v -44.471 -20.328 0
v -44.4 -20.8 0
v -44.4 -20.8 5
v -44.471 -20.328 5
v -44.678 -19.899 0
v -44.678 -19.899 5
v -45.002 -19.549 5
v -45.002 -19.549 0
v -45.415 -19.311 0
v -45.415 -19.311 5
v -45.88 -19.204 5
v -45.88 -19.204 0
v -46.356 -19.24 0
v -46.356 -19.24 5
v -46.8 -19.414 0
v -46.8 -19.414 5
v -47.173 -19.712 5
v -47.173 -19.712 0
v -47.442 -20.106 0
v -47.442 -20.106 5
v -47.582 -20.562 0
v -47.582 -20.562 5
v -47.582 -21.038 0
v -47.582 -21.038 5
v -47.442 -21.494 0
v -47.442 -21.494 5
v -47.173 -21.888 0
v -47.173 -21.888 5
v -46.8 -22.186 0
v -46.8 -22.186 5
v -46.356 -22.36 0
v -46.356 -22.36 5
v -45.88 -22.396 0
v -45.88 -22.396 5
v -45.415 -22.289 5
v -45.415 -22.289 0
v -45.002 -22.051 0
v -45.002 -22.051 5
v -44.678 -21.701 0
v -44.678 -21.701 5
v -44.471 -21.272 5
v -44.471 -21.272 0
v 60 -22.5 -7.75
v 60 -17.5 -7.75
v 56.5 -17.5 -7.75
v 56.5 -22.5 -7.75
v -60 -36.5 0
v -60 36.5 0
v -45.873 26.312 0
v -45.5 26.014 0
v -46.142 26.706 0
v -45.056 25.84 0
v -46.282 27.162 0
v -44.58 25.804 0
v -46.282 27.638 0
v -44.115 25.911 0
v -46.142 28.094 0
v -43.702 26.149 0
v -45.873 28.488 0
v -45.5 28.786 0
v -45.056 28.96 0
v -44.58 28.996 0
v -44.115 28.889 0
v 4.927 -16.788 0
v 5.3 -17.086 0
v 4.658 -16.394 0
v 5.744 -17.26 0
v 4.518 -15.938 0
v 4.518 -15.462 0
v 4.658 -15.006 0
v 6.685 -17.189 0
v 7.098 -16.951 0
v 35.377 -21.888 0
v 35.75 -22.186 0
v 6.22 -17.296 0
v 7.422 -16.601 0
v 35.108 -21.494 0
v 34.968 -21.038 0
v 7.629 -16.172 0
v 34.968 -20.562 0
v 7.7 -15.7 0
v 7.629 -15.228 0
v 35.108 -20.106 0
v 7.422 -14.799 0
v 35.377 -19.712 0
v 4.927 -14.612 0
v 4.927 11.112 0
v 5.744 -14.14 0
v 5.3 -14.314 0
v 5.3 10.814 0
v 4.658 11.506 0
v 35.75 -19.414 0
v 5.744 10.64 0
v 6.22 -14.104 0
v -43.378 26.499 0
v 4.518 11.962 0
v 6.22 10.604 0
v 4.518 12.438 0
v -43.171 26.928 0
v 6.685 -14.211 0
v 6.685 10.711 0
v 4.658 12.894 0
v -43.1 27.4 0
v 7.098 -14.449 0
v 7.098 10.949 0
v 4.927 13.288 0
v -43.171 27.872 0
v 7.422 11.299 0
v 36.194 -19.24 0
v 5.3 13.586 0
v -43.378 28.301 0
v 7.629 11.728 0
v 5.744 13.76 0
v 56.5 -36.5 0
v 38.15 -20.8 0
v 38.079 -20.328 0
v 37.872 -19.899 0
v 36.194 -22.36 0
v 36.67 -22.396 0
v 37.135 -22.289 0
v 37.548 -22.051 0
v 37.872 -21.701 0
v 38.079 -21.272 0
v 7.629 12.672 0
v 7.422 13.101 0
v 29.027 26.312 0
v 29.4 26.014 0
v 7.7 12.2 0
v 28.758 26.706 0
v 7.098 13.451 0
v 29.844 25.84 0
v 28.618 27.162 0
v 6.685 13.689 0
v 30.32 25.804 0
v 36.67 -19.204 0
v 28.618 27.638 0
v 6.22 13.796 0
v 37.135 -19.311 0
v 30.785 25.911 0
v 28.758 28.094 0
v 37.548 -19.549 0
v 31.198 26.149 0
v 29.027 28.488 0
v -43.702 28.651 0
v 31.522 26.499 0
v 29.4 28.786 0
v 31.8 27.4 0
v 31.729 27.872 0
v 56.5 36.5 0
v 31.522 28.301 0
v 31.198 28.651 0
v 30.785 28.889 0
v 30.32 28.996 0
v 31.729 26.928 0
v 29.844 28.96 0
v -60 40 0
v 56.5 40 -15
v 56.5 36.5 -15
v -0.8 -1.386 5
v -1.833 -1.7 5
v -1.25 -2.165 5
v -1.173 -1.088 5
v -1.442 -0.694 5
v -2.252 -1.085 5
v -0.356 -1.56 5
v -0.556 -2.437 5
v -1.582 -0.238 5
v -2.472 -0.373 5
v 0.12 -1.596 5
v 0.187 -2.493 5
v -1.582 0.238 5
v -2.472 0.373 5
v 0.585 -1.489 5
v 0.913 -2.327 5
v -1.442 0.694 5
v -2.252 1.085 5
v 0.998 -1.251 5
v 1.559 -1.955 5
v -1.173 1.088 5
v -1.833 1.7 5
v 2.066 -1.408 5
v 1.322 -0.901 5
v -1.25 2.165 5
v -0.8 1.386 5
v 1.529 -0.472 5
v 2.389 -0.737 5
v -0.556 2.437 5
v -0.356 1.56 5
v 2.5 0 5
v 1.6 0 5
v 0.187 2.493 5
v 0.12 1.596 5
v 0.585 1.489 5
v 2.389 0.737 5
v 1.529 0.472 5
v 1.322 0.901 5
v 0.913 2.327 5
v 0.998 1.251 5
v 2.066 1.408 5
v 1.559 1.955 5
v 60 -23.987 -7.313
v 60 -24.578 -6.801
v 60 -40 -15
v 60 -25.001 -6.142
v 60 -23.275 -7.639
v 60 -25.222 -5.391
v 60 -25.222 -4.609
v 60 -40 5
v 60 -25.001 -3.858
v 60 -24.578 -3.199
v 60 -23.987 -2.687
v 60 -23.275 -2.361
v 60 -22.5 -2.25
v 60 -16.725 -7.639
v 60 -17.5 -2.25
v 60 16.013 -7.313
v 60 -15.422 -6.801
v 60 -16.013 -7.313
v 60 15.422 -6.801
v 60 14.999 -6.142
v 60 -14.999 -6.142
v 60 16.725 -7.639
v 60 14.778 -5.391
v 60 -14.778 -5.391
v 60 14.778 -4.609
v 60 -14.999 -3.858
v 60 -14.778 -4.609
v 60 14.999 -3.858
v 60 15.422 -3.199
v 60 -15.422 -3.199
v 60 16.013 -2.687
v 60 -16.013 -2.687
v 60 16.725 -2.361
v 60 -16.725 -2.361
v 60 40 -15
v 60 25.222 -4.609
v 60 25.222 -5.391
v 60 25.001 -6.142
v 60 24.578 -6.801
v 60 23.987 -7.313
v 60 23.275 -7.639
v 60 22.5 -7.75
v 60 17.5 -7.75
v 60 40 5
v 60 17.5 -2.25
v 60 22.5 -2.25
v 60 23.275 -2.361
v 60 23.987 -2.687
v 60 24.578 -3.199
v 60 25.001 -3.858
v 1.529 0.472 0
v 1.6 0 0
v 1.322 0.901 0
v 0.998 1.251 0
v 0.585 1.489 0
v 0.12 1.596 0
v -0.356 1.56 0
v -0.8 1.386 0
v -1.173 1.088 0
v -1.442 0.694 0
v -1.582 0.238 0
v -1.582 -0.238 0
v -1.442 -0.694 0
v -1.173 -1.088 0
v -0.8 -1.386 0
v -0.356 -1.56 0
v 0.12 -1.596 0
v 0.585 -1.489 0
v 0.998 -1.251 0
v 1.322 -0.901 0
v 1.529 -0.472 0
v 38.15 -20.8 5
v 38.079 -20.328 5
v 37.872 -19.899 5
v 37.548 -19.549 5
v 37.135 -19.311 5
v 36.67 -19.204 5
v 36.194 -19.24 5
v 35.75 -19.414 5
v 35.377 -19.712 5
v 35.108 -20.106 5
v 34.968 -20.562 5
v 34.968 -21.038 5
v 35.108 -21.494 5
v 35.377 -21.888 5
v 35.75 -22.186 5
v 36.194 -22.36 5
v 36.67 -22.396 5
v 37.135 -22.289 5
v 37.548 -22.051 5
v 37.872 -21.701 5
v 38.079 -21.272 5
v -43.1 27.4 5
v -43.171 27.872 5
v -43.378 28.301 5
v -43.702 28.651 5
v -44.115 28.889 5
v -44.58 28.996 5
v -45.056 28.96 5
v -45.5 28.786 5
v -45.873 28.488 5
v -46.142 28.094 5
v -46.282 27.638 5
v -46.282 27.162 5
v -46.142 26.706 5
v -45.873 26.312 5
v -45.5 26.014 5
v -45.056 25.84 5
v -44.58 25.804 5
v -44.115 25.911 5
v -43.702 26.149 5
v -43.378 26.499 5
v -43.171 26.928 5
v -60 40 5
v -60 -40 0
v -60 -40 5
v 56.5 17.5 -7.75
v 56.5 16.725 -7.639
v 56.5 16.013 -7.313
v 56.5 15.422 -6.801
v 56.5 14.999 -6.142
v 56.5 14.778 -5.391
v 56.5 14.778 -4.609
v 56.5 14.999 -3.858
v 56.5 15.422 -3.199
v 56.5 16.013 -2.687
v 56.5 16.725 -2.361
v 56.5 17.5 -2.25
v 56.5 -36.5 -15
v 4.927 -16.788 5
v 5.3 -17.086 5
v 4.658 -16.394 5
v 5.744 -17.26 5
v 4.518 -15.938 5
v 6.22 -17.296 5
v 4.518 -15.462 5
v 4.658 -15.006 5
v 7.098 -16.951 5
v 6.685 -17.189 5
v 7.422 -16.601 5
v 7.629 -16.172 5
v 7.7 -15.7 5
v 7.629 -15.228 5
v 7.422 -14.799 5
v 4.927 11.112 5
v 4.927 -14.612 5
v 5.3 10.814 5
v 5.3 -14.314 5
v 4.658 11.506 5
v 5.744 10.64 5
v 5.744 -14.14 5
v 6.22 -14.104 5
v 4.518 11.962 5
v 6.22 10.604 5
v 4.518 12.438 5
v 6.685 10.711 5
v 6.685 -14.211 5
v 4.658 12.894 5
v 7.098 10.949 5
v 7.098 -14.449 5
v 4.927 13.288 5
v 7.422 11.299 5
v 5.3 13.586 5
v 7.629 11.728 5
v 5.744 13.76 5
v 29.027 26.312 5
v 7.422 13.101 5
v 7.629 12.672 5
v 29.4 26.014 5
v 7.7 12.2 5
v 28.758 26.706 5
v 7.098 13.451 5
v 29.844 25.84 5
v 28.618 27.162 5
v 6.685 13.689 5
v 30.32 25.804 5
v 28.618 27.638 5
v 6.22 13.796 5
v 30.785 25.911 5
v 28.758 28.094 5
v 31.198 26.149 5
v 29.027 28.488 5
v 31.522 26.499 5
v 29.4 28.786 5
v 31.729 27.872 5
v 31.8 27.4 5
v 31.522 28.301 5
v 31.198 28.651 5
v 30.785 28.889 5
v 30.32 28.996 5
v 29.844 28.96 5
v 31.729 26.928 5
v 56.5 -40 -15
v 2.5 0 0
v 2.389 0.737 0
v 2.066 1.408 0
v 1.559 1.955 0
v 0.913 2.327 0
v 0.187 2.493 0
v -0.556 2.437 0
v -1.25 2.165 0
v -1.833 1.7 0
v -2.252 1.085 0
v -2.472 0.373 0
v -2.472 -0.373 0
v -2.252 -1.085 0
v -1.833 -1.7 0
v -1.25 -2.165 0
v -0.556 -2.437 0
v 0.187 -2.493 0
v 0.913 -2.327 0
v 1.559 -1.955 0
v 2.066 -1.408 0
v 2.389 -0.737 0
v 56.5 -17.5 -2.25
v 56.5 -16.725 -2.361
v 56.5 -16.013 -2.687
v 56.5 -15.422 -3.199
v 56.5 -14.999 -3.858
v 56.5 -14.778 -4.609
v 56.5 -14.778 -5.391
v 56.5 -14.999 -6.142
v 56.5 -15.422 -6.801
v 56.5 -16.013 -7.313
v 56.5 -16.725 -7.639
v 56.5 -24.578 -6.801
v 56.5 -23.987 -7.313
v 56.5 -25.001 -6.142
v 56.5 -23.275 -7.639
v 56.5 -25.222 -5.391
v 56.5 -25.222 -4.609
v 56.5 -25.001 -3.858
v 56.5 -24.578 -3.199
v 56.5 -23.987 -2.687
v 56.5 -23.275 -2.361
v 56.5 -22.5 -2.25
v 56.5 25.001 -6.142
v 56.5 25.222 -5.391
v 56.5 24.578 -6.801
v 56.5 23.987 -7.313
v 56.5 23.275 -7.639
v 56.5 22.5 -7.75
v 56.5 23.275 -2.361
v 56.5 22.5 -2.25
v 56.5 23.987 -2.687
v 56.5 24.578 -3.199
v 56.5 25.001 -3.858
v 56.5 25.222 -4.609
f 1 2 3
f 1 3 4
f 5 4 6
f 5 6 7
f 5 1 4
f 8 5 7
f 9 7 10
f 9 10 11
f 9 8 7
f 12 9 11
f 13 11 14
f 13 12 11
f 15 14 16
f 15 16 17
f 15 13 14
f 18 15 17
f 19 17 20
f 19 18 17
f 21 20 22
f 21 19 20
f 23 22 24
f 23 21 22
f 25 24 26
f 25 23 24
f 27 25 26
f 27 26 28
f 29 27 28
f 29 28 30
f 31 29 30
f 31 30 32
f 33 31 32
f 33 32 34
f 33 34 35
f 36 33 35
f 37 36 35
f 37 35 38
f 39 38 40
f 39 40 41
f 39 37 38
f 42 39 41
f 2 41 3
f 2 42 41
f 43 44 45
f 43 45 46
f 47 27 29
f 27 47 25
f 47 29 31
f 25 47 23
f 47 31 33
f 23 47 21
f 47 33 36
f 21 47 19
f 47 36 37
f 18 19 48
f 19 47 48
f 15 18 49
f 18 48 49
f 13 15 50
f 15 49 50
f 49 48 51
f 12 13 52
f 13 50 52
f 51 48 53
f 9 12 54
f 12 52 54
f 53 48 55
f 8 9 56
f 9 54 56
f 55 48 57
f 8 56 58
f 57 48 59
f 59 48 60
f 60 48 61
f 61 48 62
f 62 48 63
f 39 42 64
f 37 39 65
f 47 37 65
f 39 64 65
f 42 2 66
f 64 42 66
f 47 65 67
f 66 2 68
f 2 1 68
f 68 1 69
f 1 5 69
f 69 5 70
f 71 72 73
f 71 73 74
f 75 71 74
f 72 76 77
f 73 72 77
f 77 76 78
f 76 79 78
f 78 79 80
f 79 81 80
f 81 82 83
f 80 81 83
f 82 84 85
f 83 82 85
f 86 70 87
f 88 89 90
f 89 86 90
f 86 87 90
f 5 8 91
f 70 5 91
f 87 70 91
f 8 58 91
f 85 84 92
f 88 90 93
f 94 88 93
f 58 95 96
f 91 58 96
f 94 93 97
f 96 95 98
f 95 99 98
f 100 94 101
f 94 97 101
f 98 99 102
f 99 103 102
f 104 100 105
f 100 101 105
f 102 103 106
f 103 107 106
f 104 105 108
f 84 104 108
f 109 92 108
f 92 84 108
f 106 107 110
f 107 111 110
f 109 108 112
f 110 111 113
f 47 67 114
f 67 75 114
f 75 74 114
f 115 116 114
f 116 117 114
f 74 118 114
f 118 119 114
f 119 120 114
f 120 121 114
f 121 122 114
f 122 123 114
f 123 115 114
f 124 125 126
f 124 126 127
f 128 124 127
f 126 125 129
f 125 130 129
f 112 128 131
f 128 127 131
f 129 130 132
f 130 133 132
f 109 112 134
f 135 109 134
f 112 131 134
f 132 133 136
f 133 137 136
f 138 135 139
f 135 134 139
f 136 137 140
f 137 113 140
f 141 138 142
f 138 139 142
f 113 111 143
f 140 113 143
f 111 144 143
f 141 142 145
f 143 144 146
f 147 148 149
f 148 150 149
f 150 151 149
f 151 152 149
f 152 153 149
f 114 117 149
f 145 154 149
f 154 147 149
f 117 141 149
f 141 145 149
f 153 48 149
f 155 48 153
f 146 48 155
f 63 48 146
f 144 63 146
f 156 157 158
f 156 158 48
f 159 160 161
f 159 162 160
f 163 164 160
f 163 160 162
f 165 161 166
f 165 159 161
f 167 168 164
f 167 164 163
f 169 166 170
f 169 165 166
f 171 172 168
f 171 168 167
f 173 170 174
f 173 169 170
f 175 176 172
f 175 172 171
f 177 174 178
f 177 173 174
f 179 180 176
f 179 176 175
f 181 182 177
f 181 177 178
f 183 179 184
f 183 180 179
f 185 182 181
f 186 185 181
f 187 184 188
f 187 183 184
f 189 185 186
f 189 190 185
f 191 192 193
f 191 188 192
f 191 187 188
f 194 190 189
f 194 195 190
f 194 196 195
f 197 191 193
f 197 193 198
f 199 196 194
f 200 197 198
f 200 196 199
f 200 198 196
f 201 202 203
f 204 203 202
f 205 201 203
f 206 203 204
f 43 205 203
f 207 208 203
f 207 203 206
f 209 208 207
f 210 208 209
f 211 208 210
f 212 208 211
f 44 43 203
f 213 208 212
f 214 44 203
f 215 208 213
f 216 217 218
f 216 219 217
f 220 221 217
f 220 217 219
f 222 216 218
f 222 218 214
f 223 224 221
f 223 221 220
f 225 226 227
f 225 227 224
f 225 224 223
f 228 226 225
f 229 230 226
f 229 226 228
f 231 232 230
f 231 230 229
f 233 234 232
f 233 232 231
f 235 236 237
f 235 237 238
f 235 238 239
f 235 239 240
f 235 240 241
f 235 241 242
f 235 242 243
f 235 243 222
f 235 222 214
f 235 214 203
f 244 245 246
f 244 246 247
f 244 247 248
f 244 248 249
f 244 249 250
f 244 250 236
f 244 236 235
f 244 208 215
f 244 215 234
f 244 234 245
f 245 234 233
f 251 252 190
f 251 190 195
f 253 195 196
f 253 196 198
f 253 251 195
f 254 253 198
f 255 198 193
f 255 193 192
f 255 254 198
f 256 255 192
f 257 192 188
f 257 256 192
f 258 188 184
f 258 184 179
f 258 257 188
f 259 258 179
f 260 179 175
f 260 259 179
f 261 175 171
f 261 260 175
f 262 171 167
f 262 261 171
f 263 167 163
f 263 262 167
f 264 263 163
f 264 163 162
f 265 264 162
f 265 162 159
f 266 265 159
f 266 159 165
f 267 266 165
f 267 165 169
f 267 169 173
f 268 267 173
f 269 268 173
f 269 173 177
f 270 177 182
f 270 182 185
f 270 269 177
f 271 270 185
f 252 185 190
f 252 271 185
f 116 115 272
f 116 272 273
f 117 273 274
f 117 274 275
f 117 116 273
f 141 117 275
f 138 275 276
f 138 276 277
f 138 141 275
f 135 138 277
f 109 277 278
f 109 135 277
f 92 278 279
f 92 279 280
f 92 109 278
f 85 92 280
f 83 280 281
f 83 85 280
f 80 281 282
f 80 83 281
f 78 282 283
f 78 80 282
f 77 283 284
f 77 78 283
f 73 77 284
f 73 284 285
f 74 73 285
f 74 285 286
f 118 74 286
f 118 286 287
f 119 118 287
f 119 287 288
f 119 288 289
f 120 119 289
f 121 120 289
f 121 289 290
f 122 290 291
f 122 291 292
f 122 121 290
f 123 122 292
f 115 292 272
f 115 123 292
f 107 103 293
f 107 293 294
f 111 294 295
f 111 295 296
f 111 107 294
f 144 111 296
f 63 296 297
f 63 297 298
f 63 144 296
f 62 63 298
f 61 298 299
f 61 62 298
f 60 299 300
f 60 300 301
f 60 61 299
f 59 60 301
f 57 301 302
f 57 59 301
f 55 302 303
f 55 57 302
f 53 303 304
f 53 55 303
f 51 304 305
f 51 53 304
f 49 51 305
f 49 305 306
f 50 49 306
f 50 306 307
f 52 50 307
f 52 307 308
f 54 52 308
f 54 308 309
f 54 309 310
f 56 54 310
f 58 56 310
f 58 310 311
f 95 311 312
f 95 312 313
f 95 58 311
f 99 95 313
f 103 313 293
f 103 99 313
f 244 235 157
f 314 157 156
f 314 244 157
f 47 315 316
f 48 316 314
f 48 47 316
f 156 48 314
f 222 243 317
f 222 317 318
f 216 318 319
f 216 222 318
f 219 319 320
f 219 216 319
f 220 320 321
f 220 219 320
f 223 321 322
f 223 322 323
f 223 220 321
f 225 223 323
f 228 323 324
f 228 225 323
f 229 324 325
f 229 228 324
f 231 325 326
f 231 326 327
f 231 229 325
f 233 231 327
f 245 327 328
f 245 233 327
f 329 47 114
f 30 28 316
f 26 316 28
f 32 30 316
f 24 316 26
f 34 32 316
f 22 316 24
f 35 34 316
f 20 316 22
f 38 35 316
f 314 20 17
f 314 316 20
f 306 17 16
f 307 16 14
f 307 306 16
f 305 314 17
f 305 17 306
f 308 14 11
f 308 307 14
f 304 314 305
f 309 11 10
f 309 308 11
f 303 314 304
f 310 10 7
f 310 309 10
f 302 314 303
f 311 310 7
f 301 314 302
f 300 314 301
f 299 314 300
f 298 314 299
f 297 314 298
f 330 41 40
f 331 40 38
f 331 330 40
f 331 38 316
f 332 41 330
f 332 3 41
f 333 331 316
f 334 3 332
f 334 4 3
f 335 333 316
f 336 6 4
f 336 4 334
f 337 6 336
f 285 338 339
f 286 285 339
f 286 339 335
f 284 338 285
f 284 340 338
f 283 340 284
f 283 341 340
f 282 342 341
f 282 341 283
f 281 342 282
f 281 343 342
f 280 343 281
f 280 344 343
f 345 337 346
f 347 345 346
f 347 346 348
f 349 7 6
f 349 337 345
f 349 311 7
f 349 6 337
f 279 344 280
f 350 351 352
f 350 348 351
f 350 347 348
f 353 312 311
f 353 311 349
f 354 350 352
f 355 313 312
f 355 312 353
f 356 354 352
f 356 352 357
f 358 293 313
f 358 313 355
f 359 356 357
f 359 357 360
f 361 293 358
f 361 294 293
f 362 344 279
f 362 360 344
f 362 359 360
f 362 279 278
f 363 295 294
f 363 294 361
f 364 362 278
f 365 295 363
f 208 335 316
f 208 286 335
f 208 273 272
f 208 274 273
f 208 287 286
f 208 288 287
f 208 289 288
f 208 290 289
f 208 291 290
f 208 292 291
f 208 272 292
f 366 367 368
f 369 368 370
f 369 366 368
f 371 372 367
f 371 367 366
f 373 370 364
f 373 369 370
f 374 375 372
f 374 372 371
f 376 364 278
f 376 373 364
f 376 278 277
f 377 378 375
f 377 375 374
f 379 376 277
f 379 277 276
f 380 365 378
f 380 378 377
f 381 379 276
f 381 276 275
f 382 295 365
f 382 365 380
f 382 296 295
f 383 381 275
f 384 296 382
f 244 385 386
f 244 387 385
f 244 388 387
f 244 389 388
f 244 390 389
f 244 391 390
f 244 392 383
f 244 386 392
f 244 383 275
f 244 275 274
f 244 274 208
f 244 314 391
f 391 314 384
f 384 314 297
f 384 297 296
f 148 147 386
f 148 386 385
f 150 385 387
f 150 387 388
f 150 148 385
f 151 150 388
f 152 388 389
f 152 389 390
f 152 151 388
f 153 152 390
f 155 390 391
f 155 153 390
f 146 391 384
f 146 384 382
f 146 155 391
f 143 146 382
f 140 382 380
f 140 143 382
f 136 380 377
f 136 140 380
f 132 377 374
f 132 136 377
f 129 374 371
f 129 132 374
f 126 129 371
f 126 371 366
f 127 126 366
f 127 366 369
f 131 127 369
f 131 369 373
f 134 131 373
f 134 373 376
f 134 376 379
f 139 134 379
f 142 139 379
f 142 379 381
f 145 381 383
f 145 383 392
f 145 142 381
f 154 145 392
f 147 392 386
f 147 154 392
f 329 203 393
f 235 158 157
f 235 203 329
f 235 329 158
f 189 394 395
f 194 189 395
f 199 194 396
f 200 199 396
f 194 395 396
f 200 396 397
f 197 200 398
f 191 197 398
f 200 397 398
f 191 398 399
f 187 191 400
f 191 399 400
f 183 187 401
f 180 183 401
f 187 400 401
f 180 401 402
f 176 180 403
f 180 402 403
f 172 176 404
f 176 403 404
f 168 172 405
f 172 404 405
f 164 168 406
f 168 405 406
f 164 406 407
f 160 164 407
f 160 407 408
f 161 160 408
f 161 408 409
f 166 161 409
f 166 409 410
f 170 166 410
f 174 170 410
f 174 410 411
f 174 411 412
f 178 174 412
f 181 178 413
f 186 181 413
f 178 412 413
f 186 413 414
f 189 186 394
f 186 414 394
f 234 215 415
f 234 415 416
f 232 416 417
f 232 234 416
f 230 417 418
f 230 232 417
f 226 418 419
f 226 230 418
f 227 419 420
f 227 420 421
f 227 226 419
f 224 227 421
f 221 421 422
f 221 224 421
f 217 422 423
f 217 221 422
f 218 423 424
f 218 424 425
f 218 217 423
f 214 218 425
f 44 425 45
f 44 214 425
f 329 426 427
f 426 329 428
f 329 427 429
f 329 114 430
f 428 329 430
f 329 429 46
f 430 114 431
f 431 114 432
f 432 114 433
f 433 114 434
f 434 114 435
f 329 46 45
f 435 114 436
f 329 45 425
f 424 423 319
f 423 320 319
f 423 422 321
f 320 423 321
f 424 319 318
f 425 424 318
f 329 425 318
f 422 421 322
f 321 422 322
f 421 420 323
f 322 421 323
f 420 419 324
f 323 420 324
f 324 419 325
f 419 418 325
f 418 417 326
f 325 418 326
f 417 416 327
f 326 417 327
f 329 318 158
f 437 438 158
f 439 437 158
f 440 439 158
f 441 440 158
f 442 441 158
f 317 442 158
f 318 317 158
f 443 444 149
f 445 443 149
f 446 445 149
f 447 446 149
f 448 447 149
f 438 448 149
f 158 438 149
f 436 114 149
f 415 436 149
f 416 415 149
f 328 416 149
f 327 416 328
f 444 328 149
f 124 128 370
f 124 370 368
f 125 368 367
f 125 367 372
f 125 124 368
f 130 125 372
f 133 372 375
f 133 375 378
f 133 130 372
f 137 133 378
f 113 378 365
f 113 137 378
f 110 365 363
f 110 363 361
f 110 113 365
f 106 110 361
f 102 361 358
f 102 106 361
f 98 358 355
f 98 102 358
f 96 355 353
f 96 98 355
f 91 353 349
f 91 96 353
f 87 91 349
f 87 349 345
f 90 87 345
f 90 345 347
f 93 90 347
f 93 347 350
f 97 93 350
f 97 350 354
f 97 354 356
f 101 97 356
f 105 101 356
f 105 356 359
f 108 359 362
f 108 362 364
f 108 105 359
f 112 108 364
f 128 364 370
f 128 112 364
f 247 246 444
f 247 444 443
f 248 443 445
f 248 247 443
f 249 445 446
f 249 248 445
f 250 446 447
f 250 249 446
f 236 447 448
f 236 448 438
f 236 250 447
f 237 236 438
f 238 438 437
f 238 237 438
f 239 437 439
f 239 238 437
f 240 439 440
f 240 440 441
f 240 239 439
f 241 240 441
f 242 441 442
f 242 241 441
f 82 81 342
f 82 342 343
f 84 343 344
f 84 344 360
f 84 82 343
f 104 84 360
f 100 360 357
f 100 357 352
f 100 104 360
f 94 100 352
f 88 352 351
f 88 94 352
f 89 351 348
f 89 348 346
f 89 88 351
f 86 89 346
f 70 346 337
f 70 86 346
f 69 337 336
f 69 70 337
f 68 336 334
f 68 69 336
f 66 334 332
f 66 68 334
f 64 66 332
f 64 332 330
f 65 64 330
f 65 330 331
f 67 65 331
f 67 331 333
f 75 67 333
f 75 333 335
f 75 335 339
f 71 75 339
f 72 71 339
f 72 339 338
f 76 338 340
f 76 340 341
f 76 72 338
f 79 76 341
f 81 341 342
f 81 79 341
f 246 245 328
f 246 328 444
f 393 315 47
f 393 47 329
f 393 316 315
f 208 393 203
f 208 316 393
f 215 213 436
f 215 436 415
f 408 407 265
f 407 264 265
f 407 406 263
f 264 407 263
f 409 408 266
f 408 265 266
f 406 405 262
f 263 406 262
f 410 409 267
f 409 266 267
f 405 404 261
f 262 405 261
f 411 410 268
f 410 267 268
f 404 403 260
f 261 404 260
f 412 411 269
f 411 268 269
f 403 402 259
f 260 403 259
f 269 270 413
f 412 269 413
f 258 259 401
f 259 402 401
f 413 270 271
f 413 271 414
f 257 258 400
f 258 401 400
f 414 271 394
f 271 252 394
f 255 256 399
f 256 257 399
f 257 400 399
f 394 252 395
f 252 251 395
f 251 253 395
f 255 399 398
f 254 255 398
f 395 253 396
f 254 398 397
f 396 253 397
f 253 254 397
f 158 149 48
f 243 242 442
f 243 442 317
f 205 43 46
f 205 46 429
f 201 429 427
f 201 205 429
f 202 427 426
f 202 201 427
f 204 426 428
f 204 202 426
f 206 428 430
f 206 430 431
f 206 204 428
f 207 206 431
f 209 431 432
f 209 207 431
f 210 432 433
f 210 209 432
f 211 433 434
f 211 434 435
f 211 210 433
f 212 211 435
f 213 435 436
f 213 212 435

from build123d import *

# Parameters (mm, degrees)
F0_W     = 120
F0_H     = 80
F0_R     = 1.6
F1_DEPTH = 5
F2_W     = 80
F2_H     = 20
F3_DEPTH = 3.5
F5_DEPTH = 3.5
F7_DEPTH = 3.5
F8_R     = 2.5
F8_R_2   = 1.6
F9_DEPTH = 5


with BuildPart() as f1:
    # F0 (on Top) → F1 (new body)
    with BuildSketch(Plane.XY):
        Rectangle(F0_W, F0_H)
        with Locations((-46, -20.8)):
            Circle(F0_R, mode=Mode.SUBTRACT)
        with Locations((36.55, -20.8)):
            Circle(F0_R, mode=Mode.SUBTRACT)
        with Locations((6.1, -15.7)):
            Circle(F0_R, mode=Mode.SUBTRACT)
        with Locations((-44.7, 27.4)):
            Circle(F0_R, mode=Mode.SUBTRACT)
        with Locations((6.1, 12.2)):
            Circle(F0_R, mode=Mode.SUBTRACT)
        with Locations((30.2, 27.4)):
            Circle(F0_R, mode=Mode.SUBTRACT)
    extrude(amount=F1_DEPTH)

    # F2 (on face) → F3 (join)
    with BuildSketch(Plane.YZ.offset(60)):
        with Locations((0, -5)):
            Rectangle(F2_W, F2_H)
        with BuildLine():
            ThreePointArc((-17.5, -2.25), (-14.75, -5), (-17.5, -7.75))
            Line((-17.5, -7.75), (-22.5, -7.75))
            ThreePointArc((-22.5, -7.75), (-25.25, -5), (-22.5, -2.25))
            Line((-22.5, -2.25), (-17.5, -2.25))
        make_face(mode=Mode.SUBTRACT)
        with BuildLine():
            ThreePointArc((22.5, -2.25), (25.25, -5), (22.5, -7.75))
            Line((22.5, -7.75), (17.5, -7.75))
            ThreePointArc((17.5, -7.75), (14.75, -5), (17.5, -2.25))
            Line((17.5, -2.25), (22.5, -2.25))
        make_face(mode=Mode.SUBTRACT)
    extrude(amount=-F3_DEPTH)

    # F4 (on face) → F5 (join)
    with BuildSketch(Plane.XZ.offset(40)):
        Polygon((-60, 0), (56.5, -15), (56.5, 0), align=None)
    extrude(amount=-F5_DEPTH)

    # F6 (on face) → F7 (join)
    with BuildSketch(Plane(origin=(0, 40, 0), x_dir=(-1, 0, 0), z_dir=(0, 1, 0))):
        Polygon((-56.5, 0), (-56.5, -15), (60, 0), align=None)
    extrude(amount=-F7_DEPTH)


with BuildPart() as f9:
    # F8 (on Top) → F9 (new body)
    with BuildSketch(Plane.XY):
        Circle(F8_R)
        Circle(F8_R_2, mode=Mode.SUBTRACT)
    extrude(amount=F9_DEPTH)


solid = Compound([f1.part, f9.part])
